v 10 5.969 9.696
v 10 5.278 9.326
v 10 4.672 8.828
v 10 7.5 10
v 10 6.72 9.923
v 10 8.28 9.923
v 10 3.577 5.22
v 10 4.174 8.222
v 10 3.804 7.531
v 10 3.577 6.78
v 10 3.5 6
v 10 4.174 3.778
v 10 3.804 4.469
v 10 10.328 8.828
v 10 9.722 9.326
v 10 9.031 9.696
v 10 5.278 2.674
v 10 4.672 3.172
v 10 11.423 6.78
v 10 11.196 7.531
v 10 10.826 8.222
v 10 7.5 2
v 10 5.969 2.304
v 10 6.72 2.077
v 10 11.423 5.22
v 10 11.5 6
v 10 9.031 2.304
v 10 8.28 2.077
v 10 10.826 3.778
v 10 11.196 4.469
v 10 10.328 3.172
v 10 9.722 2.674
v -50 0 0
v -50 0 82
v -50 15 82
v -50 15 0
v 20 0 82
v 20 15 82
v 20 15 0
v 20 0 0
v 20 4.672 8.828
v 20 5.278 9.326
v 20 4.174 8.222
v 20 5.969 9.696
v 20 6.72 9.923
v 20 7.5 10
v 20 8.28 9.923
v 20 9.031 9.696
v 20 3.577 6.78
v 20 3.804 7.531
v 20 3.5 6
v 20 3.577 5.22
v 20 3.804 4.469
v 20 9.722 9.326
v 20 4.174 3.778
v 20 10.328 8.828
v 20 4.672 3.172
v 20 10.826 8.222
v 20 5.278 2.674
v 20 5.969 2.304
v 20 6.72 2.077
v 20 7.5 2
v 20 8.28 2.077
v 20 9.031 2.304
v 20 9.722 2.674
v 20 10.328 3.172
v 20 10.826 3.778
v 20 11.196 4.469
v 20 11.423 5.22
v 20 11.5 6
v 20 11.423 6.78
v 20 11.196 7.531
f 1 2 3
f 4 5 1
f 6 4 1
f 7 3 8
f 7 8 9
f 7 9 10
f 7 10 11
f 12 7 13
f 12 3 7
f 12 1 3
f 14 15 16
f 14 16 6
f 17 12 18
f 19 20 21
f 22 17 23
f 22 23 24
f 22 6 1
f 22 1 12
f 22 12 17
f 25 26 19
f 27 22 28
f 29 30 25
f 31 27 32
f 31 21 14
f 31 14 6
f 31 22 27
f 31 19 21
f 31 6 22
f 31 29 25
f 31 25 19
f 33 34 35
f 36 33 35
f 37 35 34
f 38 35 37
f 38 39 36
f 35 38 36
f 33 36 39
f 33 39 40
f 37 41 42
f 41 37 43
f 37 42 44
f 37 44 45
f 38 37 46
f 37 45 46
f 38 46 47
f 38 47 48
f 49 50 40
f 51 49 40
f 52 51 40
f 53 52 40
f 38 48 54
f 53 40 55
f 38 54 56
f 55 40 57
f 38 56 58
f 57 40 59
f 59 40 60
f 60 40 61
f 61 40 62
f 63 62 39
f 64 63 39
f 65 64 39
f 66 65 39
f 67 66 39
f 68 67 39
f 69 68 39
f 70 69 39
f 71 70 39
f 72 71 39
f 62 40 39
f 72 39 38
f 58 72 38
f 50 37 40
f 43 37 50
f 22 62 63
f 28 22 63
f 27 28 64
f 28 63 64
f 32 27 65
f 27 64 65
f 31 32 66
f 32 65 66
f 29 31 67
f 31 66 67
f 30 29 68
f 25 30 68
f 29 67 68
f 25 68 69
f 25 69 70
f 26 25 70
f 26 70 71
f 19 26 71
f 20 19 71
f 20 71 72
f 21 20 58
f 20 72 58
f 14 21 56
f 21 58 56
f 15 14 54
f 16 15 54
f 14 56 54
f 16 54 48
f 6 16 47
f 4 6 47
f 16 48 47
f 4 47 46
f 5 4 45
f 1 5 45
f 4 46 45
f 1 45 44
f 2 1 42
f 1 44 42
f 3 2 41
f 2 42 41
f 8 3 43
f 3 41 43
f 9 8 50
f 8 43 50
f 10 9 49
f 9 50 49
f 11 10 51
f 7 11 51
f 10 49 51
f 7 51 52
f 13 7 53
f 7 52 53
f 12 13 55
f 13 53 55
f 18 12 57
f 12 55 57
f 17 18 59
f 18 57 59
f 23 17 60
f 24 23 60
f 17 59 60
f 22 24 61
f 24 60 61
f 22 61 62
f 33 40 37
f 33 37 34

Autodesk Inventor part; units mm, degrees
ref_plane "YZ Plane" through (0, 0, 0) normal (1, 0, 0) x (0, 1, 0)
ref_plane "XZ Plane" through (0, 0, 0) normal (0, 1, 0) x (-1, 0, 0)
ref_plane "XY Plane" through (0, 0, 0) normal (0, 0, 1) x (1, 0, 0)
sketch "Sketch1" plane through (0, 0, 0) normal (0, 0, 1) x (1, 0, 0)
  line L0 (0, 0) -> (20, 0)
  line L1 (20, 0) -> (20, 15)
  line L2 (20, 15) -> (0, 15)
  line L3 (0, 15) -> (0, 0)
  dimension "d0" = 20
  dimension "d1" = 15
extrude "Extrusion1" add sketch "Sketch1" along normal blind 12
sketch "Sketch2" plane through (20, 0, 0) normal (1, 0, 0) x (0, 0, -1)
  circle A0 centre (-6, 7.5) radius 4
  point P0 (0, 0)
  dimension "d4" = 8
extrude "Extrusion2" cut sketch "Sketch2" against normal blind 10
sketch "Sketch3" plane through (0, 0, 12) normal (0, 0, 1) x (1, 0, 0)
  line L0 (4.6713, 10.3664) -> (9.2786, 10.3664)
  line L1 (9.2786, 10.3664) -> (9.2786, 7.6788)
  line L2 (9.2786, 7.6788) -> (4.6713, 7.6788)
  line L3 (4.6713, 7.6788) -> (4.6713, 10.3664)
  point P0 (0, 0)
extrude "Extrusion3" add sketch "Sketch3" along normal blind 10
sketch "Sketch4" plane through (0, 0, 12) normal (0, 0, 1) x (1, 0, 0)
  line L0 (20, 0) -> (20, 15) projected
  line L1 (0, 15) -> (0, 0) projected
  line L2 (20, 15) -> (0, 15)
  line L3 (0, 15) -> (0, 0)
  line L4 (0, 0) -> (20, 0)
  line L5 (20, 0) -> (20, 15)
extrude "Extrusion4" add sketch "Sketch4" along normal blind 50
sketch "Sketch5" plane through (0, 0, 0) normal (-1, 0, 0) x (0, 0, 1)
  line L0 (0, 15) -> (62, 15) projected
  line L1 (0, 0) -> (62, 0)
  line L2 (62, 0) -> (62, 15)
  line L3 (62, 15) -> (0, 15)
  line L4 (0, 15) -> (0, 0)
extrude "Extrusion5" add sketch "Sketch5" along normal blind 50
sketch "Sketch6" plane through (0, 0, 62) normal (0, 0, 1) x (1, 0, 0)
  line L0 (20, 0) -> (20, 15) projected
  line L1 (20, 15) -> (-50, 15) projected
  line L2 (20, 0) -> (-50, 0)
  line L3 (-50, 0) -> (-50, 15)
  line L4 (-50, 15) -> (20, 15)
  line L5 (20, 15) -> (20, 0)
  point P0 (0, 0)
extrude "Extrusion6" add sketch "Sketch6" along normal blind 20
properties part number "closing"
